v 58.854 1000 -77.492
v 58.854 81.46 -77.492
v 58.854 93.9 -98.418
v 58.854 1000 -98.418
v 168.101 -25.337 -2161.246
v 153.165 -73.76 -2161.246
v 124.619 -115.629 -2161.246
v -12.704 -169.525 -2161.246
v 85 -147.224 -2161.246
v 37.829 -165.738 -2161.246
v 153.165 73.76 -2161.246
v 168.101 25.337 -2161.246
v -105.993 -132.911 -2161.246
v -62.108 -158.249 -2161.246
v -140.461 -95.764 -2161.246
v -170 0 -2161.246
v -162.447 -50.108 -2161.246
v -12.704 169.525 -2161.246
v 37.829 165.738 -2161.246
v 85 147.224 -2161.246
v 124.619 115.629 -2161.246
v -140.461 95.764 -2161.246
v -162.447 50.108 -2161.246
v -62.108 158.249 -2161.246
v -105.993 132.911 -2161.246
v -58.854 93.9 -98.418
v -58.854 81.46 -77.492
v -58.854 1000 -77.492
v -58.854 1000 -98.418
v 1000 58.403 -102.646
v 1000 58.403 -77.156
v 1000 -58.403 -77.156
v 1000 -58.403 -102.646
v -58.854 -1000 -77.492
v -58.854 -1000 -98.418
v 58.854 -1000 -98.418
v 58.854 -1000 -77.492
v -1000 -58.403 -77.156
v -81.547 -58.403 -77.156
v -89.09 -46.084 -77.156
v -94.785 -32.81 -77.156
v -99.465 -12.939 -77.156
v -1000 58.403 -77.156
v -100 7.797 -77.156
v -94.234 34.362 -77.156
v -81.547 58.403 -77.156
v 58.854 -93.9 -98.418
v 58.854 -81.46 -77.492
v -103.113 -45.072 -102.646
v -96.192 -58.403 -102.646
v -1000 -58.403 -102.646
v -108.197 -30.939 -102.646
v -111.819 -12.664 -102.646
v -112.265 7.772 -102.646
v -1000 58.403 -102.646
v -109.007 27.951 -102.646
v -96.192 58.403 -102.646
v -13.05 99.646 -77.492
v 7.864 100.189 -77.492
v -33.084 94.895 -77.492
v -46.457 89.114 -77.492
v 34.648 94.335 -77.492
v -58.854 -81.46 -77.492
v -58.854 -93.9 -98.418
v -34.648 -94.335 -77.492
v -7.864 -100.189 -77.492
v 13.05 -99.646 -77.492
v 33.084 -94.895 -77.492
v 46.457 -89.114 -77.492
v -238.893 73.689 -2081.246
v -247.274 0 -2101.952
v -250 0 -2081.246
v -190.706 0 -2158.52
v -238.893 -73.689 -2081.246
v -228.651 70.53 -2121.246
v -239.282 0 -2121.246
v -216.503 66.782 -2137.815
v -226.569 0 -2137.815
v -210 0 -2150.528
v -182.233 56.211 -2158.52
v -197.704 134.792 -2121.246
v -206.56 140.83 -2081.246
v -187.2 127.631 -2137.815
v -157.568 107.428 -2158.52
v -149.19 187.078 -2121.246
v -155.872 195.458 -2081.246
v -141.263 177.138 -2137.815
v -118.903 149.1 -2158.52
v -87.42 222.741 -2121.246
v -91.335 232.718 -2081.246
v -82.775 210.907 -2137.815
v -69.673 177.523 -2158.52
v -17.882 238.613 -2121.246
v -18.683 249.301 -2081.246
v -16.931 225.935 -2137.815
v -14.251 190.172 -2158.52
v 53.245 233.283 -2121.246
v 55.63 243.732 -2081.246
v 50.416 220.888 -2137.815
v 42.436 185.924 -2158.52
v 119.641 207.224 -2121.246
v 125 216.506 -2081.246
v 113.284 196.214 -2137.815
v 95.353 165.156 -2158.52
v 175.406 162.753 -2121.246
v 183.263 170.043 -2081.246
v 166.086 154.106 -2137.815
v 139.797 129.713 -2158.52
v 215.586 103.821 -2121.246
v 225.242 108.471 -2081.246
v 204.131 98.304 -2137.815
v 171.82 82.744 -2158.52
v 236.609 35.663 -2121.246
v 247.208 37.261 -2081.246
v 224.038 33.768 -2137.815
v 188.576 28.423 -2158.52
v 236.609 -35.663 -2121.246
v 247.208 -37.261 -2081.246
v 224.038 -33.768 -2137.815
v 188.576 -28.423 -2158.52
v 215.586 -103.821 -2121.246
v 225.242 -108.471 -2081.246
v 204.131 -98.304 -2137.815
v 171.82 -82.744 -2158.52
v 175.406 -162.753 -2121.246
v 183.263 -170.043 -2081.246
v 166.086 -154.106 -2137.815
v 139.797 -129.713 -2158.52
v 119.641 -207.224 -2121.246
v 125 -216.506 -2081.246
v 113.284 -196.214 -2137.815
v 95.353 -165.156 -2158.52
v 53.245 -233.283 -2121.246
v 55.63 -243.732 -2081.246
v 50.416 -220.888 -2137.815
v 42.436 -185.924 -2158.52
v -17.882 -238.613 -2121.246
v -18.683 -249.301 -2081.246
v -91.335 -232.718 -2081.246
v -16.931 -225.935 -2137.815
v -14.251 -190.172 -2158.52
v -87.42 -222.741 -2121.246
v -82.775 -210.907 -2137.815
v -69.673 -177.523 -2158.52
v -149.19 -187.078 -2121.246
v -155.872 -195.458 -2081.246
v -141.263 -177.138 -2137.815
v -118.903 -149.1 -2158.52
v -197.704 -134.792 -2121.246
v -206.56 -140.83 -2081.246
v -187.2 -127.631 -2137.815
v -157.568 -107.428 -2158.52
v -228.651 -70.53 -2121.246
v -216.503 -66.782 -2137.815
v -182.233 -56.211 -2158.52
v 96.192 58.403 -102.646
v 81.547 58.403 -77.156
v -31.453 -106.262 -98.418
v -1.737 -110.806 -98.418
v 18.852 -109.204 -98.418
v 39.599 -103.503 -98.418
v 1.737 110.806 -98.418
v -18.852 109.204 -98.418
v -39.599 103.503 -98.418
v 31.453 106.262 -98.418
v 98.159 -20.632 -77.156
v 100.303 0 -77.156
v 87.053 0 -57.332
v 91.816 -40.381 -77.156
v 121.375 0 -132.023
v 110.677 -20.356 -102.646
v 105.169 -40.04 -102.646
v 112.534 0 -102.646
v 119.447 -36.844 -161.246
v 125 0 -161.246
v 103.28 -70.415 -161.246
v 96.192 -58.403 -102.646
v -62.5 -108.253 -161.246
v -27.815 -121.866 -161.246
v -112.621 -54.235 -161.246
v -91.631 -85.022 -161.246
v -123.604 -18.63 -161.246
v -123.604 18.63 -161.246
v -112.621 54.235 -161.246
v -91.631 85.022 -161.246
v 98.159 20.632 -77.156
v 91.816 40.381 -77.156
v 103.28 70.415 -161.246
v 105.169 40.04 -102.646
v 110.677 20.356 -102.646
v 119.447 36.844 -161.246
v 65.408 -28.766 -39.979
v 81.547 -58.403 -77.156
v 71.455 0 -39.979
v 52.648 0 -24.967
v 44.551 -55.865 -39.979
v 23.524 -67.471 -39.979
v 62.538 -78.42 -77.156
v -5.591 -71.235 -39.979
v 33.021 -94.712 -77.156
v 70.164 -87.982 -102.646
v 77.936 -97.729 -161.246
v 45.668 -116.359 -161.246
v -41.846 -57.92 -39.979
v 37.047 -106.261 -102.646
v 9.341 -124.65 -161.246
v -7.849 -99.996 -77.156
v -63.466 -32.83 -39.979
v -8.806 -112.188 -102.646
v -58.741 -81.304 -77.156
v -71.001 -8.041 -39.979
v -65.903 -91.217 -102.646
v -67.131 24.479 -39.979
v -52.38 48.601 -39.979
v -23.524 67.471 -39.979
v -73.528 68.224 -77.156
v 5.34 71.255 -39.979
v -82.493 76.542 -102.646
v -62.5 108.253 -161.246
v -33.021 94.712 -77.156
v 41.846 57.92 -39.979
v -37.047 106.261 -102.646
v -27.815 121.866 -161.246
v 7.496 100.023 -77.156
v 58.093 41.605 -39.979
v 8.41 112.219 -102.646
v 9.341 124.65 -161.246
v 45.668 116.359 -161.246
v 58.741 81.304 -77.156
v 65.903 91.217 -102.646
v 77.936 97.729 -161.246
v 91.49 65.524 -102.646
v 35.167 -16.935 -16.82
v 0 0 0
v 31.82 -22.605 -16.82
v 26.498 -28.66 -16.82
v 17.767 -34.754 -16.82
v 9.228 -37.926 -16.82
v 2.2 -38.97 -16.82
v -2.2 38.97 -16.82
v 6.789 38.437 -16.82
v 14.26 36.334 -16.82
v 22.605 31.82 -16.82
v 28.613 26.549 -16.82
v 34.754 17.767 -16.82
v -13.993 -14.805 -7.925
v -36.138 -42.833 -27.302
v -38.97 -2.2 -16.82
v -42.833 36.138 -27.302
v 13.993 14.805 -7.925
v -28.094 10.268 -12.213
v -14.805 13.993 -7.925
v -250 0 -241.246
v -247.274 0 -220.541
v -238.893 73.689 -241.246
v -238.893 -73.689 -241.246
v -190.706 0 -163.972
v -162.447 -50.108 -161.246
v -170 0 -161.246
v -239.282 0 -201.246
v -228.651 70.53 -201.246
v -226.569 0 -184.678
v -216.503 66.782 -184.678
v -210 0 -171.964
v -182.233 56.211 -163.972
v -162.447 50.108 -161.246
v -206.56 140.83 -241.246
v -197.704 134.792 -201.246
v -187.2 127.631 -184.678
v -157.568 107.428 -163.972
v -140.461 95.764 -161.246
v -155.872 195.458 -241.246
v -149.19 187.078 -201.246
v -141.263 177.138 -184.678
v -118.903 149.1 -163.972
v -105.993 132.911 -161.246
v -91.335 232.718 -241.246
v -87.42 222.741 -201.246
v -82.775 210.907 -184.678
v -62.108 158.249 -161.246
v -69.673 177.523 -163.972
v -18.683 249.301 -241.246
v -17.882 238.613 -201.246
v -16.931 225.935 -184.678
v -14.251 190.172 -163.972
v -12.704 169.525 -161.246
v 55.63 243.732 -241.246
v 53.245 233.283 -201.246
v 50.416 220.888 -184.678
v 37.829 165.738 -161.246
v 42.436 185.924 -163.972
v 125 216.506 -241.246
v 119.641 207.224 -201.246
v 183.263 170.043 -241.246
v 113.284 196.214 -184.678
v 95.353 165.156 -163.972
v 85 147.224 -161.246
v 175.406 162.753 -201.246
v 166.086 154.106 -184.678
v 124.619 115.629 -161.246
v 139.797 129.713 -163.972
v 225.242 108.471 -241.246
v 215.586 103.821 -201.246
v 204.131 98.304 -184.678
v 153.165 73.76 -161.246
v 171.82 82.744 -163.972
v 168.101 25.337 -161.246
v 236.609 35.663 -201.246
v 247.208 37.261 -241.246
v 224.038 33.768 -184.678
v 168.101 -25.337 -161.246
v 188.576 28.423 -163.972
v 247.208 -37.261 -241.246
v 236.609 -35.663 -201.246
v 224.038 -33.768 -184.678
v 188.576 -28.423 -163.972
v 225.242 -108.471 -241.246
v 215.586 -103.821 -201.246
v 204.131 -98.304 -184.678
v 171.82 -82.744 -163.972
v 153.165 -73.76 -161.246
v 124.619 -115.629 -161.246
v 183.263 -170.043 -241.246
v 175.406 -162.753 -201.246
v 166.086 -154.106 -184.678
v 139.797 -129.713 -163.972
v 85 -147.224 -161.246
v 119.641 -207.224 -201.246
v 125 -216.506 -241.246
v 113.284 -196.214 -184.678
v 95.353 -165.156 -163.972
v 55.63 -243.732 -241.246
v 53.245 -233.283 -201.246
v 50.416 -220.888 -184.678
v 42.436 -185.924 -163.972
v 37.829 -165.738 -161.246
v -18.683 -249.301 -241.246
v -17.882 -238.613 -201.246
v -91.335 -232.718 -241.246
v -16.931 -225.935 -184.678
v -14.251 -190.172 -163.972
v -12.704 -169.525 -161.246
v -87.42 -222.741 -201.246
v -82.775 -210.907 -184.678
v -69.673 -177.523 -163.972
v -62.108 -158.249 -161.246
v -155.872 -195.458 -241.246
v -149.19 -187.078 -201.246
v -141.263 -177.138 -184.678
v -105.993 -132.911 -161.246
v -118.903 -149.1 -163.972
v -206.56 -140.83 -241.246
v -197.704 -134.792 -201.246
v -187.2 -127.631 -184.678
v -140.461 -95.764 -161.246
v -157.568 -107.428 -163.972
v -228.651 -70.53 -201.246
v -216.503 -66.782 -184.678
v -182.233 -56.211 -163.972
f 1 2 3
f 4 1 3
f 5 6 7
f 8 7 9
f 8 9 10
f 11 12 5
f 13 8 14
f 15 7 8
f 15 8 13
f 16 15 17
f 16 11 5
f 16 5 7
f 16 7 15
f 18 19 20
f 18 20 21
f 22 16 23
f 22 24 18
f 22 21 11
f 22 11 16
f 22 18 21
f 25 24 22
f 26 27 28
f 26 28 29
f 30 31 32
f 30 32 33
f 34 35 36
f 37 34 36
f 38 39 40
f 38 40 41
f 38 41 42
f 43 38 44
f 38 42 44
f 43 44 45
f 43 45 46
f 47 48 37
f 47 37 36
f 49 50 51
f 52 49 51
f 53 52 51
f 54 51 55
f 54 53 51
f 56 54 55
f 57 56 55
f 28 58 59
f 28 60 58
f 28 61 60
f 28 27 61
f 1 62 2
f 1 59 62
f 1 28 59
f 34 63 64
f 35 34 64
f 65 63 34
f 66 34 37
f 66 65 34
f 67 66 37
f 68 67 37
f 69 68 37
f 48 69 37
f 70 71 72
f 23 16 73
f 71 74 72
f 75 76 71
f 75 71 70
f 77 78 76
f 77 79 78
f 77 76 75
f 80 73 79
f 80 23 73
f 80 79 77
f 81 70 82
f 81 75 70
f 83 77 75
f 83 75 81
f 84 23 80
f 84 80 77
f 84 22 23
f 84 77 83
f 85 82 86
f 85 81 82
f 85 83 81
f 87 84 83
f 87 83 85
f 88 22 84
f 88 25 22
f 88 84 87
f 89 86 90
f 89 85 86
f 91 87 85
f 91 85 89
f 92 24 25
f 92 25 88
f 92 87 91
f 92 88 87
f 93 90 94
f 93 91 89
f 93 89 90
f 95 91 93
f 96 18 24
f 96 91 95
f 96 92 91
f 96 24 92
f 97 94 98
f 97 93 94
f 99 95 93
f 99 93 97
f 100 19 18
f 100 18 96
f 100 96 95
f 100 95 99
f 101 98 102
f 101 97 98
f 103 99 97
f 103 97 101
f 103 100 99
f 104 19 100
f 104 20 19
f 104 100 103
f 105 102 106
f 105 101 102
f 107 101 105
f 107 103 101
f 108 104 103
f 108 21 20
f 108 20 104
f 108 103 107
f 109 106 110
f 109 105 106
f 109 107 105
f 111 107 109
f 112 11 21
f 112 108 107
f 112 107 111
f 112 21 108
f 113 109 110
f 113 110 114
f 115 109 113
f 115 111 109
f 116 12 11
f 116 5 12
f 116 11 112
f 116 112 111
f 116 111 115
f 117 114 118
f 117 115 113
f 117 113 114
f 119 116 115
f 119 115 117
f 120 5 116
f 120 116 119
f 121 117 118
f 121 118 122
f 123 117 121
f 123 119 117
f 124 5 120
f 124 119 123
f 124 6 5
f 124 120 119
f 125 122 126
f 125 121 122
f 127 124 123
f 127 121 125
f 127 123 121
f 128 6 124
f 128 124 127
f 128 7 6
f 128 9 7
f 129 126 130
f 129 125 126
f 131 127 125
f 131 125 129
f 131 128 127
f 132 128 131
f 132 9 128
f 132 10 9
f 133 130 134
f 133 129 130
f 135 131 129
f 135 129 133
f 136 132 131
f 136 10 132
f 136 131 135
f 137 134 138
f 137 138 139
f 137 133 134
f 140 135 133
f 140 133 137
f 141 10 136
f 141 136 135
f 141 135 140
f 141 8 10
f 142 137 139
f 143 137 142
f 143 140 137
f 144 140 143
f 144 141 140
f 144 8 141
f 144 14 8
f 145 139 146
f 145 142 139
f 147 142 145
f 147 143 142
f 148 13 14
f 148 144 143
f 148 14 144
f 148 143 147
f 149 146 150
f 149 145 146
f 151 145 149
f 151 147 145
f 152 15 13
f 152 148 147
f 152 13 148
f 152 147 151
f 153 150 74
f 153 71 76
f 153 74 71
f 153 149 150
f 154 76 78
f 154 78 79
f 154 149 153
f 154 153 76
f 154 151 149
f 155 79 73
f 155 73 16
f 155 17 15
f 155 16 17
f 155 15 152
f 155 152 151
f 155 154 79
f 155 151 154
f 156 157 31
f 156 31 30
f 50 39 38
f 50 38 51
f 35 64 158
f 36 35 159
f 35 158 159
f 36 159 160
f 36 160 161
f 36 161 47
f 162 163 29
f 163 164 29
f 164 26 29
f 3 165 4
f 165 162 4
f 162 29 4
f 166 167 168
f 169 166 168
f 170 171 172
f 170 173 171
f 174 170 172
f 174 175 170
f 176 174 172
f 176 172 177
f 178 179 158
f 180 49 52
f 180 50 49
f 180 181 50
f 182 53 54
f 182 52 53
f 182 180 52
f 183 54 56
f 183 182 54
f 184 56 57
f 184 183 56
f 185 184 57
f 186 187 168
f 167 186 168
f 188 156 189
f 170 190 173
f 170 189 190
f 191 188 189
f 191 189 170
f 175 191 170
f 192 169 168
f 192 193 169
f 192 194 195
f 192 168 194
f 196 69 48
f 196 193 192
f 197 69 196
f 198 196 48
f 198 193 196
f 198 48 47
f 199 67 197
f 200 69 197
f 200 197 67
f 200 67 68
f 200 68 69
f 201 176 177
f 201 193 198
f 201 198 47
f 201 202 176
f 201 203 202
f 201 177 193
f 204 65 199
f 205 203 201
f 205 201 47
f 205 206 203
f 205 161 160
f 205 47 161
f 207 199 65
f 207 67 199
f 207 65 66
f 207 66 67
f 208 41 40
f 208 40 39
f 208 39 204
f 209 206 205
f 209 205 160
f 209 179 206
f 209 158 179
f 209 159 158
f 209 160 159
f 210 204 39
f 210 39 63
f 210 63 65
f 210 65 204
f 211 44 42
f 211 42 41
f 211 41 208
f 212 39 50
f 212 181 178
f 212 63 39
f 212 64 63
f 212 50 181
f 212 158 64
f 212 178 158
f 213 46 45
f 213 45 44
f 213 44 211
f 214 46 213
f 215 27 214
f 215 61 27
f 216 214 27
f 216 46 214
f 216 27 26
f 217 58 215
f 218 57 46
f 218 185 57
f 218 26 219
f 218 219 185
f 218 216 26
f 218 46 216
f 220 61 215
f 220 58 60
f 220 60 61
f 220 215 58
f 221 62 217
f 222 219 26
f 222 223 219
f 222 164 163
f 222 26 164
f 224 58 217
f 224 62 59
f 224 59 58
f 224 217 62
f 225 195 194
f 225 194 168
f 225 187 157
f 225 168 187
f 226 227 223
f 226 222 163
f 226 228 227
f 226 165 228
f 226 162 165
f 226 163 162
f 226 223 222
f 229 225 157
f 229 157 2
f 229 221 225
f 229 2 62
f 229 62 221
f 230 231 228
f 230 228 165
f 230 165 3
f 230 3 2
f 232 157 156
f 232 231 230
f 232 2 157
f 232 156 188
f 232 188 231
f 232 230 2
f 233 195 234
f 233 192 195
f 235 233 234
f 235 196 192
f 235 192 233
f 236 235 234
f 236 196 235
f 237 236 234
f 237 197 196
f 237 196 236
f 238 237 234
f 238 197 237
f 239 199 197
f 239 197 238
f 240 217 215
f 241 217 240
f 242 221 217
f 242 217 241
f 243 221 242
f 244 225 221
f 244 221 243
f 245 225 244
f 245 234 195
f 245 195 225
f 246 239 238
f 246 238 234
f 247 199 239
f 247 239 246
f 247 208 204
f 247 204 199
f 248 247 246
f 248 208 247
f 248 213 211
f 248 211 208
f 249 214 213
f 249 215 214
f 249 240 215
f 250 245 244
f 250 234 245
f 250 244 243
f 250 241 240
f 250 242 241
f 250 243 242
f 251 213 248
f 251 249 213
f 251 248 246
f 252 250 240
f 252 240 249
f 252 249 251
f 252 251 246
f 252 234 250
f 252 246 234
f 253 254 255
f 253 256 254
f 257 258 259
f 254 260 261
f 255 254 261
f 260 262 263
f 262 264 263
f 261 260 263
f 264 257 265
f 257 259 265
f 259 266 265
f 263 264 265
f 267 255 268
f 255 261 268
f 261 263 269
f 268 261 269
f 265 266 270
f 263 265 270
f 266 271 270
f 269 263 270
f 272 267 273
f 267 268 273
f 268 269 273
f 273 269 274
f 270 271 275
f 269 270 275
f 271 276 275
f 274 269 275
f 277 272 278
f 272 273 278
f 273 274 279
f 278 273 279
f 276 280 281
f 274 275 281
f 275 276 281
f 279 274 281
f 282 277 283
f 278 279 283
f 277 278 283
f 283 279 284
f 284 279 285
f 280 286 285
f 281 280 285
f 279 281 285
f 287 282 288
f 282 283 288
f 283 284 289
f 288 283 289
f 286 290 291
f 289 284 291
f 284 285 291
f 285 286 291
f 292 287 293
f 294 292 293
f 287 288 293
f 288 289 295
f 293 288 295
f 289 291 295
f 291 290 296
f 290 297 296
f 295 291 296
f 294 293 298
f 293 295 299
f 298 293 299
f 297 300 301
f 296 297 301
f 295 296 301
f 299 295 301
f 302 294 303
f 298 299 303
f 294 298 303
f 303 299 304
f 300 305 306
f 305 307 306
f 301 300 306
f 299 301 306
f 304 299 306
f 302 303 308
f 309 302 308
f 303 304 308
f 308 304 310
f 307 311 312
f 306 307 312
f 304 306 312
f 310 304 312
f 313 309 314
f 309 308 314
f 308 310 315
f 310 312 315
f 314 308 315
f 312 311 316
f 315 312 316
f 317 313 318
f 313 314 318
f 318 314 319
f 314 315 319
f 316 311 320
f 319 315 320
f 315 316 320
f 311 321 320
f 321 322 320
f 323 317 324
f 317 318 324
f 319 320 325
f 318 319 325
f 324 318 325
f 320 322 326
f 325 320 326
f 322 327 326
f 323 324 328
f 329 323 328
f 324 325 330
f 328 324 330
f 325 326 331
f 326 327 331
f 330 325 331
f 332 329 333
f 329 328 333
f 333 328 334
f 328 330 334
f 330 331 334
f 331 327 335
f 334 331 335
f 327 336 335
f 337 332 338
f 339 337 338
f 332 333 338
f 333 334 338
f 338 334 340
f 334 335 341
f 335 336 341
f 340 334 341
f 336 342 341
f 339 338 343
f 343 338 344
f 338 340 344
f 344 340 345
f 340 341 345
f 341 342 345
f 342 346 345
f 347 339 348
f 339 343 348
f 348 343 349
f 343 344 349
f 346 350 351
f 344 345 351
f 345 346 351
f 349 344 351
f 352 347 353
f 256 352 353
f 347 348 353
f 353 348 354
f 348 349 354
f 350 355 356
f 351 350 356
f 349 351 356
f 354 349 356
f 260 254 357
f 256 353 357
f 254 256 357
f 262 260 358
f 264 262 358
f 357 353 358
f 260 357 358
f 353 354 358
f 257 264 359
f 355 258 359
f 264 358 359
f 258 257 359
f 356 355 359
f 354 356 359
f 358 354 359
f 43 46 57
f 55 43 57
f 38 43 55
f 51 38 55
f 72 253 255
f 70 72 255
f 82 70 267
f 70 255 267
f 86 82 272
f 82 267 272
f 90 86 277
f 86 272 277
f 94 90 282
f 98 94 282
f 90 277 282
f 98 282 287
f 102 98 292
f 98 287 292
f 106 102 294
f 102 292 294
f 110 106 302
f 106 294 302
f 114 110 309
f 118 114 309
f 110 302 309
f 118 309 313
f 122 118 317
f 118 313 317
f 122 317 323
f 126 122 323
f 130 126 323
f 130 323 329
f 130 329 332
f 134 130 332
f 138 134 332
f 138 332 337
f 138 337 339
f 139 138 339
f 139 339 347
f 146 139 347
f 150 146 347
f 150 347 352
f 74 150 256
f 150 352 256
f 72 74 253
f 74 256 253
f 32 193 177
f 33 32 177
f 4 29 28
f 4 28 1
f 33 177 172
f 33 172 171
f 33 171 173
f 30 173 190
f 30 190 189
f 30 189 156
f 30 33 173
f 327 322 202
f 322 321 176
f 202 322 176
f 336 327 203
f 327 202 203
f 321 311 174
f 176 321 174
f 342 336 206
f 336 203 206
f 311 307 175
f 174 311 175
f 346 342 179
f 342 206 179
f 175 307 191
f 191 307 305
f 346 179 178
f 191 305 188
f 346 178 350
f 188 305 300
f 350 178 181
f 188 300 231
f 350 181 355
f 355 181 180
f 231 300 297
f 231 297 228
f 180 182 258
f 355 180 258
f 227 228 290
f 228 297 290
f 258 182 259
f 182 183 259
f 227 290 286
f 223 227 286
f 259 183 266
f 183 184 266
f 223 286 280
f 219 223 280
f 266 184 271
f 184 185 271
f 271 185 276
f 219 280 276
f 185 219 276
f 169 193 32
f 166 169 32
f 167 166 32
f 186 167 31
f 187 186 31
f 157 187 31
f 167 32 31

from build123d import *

# Parameters (mm, degrees)
SKETCH2_R           = 250
BOSS_EXTRUDE1_DEPTH = 2000
FILLET1_R           = 80
SKETCH3_W           = 117.707675128
SKETCH3_H           = 20.925808911
BOSS_EXTRUDE2_DEPTH = 1000
SKETCH4_W           = 25.490495711
SKETCH4_H           = 116.80598679
BOSS_EXTRUDE3_DEPTH = 1000


with BuildPart() as part:
    # Sketch1 → Revolve1 (revolve)
    with BuildSketch(Plane(origin=(0, 0, 0), x_dir=(1, 0, 0), z_dir=(0, 1, 0))):
        with BuildLine():
            Line((0, 0), (0, 161.246145612))
            Line((0, 161.246145612), (125, 161.246145612))
            add(Edge.make_bspline(
                [(0, 0), (25.65029122, 9.231711725), (88.992040542, 38.310012871), (123.524419947, 115.24038597), (125, 161.246145612)],
                knots=[0, 0, 0, 0, 0.343948174, 1, 1, 1, 1], degree=3))
        make_face()
    revolve(axis=Axis((0, 0, 0), (0, 0, -1)))

    # Sketch2 → Boss-Extrude1 (add)
    with BuildSketch(Plane(origin=(0, 0, -161.246145612), x_dir=(-1, 0, 0), z_dir=(0, 0, -1))):
        Circle(SKETCH2_R)
    extrude(amount=BOSS_EXTRUDE1_DEPTH)

    # Fillet1
    fillet1_edges = [part.edges().sort_by_distance(p)[0] for p in [
        (250, 0, -161.246145612),
        (250, 0, -2161.246145612),
    ]]
    fillet(fillet1_edges, radius=FILLET1_R)

    # Sketch3 → Boss-Extrude2 (add, symmetric)
    with BuildSketch(Plane(origin=(0, 0, 0), x_dir=(1, 0, 0), z_dir=(0, 1, 0))):
        with Locations((0, 87.955012557)):
            Rectangle(SKETCH3_W, SKETCH3_H)
    extrude(amount=BOSS_EXTRUDE2_DEPTH, both=True)

    # Sketch4 → Boss-Extrude3 (add, symmetric)
    with BuildSketch(Plane(origin=(0, 0, 0), x_dir=(0, 0, -1), z_dir=(1, 0, 0))):
        with Locations((89.901006948, 0)):
            Rectangle(SKETCH4_W, SKETCH4_H)
    extrude(amount=BOSS_EXTRUDE3_DEPTH, both=True)


solid = part.part
